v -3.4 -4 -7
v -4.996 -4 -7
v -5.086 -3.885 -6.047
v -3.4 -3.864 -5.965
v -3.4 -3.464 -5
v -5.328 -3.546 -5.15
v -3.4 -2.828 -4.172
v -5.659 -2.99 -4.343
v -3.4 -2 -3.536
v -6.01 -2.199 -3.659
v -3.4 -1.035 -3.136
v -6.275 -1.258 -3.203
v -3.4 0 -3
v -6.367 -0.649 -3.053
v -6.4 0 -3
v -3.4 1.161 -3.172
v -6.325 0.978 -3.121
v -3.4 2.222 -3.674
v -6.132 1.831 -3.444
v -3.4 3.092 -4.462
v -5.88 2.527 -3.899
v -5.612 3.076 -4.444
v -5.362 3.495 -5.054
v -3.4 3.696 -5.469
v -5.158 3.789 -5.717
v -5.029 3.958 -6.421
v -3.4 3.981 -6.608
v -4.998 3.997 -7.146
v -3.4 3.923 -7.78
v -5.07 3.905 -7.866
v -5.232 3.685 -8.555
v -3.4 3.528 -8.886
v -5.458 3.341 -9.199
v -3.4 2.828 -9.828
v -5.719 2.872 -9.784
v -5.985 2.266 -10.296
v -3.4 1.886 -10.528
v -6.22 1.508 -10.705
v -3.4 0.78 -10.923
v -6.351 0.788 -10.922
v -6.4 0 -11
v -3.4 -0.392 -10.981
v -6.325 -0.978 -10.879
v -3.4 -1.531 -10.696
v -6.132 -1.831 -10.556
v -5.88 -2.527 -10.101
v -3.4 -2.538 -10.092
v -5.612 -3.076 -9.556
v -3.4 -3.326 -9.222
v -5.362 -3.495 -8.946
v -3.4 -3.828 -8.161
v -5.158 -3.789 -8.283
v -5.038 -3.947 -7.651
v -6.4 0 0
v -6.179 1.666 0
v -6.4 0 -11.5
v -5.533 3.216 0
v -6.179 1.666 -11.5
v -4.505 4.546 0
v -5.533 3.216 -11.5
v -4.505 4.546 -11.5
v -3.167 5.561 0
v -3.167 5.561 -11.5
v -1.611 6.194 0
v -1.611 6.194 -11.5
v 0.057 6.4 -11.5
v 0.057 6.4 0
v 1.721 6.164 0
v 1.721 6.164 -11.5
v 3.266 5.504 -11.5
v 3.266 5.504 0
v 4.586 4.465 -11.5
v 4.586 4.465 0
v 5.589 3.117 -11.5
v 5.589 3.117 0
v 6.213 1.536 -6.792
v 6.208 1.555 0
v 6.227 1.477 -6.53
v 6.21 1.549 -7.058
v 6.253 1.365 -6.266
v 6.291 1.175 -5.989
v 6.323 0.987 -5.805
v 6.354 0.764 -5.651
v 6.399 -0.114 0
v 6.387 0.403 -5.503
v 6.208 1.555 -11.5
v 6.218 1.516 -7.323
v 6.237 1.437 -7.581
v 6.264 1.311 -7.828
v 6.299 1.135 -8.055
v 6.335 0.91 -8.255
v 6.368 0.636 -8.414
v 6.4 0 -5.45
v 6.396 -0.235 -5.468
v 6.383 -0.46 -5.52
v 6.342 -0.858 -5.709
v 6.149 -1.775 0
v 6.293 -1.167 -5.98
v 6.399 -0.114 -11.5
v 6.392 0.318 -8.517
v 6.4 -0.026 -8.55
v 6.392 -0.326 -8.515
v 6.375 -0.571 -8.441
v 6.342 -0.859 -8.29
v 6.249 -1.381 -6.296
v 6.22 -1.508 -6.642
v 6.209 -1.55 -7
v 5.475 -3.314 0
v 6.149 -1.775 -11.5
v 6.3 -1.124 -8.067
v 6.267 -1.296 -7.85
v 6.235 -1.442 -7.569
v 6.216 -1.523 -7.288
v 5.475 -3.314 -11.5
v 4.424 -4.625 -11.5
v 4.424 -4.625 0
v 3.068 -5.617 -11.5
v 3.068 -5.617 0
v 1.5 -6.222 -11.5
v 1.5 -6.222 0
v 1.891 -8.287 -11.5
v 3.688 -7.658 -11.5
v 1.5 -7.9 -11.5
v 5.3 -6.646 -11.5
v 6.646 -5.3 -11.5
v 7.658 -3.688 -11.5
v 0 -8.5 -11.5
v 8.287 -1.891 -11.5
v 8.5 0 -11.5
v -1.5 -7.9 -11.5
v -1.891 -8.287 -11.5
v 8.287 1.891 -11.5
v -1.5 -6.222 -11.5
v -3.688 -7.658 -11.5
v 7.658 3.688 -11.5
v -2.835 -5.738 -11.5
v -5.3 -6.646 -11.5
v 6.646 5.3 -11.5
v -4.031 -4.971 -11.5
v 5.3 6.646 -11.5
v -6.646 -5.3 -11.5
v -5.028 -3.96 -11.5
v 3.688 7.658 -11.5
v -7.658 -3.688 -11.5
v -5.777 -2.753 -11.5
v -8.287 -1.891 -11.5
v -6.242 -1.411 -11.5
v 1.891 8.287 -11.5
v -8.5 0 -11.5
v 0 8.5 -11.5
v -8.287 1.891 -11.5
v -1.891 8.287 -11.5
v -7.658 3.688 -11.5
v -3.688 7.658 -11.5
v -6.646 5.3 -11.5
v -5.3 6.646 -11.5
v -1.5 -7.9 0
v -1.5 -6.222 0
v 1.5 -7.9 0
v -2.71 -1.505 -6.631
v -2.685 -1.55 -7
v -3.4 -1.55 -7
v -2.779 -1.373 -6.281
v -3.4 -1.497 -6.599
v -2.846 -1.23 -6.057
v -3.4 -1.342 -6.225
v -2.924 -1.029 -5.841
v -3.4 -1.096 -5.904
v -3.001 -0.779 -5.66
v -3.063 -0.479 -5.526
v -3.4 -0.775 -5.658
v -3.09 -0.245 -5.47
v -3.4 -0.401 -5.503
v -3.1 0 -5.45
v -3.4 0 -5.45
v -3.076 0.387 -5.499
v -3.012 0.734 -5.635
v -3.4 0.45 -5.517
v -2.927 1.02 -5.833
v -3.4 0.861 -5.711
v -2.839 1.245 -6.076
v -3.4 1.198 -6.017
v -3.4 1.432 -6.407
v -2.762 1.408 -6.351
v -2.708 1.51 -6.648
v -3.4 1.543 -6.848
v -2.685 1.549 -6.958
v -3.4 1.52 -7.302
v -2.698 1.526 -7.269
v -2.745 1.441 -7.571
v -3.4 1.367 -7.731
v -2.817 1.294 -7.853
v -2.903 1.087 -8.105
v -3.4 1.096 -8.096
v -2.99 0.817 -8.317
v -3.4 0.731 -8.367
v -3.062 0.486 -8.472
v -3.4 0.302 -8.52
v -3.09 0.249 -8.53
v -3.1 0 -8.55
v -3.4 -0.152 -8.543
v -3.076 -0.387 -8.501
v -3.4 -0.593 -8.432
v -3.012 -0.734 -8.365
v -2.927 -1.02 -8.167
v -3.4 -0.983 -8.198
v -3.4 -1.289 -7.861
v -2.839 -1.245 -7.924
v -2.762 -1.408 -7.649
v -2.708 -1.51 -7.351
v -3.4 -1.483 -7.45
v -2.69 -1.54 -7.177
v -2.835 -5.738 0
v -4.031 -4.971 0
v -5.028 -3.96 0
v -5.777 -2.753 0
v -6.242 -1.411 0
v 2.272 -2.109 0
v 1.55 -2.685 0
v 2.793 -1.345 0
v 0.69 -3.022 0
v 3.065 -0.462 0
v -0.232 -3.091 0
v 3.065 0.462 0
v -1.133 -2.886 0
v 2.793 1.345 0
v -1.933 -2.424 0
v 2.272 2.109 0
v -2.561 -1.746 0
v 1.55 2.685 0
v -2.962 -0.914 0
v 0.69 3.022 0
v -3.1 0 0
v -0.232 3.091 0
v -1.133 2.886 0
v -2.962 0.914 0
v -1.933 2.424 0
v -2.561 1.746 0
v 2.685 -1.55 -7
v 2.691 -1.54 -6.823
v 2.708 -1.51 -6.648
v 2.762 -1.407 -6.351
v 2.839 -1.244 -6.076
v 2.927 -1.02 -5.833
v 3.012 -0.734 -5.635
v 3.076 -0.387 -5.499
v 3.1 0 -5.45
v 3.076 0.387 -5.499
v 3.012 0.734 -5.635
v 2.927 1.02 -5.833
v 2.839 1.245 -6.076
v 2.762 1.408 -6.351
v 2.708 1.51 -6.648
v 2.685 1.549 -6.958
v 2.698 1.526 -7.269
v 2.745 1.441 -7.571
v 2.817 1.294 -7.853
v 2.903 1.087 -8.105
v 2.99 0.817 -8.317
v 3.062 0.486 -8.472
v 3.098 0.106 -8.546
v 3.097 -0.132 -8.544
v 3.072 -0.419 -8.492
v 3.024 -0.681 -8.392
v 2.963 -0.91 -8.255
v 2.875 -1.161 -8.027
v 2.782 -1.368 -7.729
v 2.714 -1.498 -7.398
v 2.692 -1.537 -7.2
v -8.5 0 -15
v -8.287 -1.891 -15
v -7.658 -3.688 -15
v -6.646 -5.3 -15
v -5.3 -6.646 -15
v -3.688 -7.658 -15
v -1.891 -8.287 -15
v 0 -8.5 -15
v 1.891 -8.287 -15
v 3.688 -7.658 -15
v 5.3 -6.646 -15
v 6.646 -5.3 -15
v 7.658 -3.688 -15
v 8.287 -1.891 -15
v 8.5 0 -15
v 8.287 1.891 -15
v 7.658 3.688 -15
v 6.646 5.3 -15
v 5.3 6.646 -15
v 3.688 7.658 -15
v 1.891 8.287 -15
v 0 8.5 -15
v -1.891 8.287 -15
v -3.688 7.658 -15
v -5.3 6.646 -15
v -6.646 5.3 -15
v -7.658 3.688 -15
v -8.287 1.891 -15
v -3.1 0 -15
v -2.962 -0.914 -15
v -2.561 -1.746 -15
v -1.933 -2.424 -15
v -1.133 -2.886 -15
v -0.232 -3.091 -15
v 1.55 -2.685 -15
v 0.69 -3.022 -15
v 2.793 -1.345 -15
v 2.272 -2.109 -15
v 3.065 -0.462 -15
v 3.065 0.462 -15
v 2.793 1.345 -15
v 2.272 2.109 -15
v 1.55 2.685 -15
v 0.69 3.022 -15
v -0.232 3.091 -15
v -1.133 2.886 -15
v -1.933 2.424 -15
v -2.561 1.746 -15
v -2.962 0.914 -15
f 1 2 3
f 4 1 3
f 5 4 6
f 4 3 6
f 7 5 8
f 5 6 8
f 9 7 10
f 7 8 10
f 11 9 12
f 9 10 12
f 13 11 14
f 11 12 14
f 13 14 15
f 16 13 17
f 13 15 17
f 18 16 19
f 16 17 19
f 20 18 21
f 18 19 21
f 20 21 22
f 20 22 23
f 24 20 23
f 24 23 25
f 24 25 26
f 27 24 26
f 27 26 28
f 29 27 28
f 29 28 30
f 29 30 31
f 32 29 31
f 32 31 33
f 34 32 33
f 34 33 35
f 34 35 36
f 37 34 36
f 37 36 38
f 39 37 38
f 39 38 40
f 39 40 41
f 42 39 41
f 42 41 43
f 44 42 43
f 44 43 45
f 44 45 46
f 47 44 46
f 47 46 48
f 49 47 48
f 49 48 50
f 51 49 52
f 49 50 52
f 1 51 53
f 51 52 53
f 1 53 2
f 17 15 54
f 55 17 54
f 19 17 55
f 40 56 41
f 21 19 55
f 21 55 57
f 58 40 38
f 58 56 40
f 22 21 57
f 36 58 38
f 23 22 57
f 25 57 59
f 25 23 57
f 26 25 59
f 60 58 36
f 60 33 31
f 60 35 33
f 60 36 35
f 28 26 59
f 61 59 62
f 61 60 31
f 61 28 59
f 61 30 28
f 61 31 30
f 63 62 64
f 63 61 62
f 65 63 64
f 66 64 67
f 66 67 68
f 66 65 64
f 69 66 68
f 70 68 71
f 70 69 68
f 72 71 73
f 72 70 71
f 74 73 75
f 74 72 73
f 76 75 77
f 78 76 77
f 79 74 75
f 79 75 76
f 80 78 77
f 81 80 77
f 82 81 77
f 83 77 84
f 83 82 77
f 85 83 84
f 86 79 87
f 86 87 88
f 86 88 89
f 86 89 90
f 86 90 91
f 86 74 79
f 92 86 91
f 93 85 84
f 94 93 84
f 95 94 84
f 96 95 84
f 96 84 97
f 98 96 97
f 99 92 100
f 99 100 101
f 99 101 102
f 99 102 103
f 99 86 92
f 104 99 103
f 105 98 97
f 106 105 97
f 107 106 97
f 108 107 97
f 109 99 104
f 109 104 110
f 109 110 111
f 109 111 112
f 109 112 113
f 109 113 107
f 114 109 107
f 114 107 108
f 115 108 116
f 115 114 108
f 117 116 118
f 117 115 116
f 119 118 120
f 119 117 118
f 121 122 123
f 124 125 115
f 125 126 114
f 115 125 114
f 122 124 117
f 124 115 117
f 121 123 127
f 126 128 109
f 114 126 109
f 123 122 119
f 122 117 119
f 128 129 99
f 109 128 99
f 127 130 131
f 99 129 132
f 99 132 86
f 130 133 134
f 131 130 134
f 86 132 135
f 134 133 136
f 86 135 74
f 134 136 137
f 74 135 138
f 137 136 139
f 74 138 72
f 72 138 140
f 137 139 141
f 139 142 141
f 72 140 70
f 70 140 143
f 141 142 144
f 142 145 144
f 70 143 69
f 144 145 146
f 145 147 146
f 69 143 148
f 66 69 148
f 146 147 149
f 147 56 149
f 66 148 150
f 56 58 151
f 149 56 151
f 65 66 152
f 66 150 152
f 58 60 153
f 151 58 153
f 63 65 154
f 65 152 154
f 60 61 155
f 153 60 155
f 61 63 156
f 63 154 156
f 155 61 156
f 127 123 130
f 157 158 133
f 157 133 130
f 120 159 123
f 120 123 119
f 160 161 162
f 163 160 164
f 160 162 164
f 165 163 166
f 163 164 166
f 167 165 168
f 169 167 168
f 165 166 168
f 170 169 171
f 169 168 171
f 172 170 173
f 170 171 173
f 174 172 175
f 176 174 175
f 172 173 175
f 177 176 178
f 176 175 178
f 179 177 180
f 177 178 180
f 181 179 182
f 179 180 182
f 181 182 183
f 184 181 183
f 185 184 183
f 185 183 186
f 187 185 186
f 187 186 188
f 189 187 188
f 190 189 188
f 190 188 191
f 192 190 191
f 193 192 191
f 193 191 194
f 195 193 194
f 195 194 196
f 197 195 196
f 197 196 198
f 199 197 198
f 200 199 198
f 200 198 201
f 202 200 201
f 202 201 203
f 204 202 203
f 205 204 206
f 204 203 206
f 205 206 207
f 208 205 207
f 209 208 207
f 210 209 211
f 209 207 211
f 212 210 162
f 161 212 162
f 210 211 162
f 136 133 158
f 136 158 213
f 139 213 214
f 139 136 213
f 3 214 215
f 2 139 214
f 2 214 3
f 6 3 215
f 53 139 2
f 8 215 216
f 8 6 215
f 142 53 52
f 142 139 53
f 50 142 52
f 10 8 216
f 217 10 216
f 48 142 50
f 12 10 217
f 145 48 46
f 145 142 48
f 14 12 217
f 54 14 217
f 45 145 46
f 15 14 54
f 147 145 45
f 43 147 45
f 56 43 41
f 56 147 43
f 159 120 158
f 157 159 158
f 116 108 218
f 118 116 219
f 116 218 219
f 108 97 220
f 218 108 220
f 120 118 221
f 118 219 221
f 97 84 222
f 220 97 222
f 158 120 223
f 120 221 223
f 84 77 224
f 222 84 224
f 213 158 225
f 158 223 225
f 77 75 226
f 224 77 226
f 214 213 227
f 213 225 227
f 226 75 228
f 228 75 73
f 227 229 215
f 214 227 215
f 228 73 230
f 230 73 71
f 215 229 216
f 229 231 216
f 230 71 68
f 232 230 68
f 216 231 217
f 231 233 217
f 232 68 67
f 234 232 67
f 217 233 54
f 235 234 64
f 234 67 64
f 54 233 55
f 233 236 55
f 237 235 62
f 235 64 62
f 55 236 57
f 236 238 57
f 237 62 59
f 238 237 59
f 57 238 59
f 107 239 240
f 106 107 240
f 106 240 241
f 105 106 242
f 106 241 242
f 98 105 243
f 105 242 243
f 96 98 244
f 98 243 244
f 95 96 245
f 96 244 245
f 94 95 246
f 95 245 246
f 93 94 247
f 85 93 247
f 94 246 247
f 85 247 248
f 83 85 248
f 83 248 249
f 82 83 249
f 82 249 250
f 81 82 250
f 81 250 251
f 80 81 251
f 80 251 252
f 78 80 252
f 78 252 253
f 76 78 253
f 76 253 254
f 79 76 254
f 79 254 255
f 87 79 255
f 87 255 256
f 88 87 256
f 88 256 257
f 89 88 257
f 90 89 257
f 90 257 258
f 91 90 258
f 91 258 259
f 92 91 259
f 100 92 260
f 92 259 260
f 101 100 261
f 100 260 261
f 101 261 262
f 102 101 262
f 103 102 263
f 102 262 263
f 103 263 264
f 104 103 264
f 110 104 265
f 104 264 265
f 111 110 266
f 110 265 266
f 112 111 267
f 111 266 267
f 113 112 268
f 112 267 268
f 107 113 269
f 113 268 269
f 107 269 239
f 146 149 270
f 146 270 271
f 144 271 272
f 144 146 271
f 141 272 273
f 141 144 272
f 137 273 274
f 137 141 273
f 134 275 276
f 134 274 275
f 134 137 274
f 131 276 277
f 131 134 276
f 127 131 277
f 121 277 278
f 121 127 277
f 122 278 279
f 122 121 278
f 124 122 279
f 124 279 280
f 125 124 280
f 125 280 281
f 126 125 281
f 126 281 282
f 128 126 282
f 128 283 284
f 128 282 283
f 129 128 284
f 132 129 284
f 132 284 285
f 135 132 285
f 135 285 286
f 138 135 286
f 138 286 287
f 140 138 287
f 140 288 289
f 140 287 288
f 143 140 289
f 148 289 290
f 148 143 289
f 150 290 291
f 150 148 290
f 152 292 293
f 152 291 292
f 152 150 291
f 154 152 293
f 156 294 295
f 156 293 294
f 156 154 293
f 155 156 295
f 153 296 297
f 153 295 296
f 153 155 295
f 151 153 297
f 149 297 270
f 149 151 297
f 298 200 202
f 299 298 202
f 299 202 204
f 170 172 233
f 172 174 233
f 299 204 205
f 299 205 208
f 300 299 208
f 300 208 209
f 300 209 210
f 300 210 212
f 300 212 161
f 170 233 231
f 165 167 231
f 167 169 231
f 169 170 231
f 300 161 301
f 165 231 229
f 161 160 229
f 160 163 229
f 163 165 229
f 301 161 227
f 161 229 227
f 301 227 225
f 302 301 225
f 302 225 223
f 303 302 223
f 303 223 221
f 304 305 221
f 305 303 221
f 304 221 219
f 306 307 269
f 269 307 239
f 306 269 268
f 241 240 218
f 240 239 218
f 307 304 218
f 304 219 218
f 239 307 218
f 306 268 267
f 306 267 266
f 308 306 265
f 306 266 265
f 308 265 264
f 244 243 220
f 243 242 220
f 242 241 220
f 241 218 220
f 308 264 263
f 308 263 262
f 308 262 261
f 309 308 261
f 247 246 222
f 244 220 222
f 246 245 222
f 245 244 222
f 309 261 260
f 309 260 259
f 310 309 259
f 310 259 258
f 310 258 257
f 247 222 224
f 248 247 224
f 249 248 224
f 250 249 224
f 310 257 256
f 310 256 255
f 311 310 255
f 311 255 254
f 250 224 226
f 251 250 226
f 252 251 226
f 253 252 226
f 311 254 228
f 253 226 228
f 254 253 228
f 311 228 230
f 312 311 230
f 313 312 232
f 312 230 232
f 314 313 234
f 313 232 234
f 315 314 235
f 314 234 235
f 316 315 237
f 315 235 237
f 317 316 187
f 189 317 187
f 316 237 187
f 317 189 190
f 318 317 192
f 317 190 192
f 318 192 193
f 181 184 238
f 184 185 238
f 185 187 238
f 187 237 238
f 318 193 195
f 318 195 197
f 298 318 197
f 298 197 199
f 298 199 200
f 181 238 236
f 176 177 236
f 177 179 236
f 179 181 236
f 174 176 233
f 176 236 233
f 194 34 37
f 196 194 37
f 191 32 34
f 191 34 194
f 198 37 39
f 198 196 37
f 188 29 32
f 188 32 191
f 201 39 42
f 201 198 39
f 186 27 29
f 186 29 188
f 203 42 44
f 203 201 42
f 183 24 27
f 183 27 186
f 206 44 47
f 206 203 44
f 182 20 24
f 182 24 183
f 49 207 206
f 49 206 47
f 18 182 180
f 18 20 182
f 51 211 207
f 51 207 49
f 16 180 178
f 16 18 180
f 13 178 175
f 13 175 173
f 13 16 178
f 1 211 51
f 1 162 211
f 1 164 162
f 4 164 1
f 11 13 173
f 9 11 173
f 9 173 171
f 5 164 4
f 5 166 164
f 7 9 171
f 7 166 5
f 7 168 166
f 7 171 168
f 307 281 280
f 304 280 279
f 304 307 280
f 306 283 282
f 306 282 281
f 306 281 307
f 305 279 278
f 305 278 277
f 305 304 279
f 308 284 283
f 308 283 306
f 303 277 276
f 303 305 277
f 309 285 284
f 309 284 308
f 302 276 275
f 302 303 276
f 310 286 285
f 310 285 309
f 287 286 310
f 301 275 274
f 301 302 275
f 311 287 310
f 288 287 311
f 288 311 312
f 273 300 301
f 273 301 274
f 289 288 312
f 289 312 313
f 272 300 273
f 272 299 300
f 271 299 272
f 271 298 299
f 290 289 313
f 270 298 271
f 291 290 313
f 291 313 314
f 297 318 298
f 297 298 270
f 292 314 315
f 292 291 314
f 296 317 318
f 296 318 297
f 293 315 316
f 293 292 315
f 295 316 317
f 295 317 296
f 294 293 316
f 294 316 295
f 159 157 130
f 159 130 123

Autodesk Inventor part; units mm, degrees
ref_plane "YZ Plane" through (0, 0, 0) normal (1, 0, 0) x (0, 1, 0)
ref_plane "XZ Plane" through (0, 0, 0) normal (0, 1, 0) x (-1, 0, 0)
sketch "Sketch1" plane through (0, 0, 0) normal (0, 1, 0) x (-1, 0, 0)
  line L0 (0, 0) -> (0, -7)
  circle A0 centre (0, -7) radius 1.55
  line L1 (3.1, 0) -> (6.4, 0)
  circle A1 centre (0, -7) radius 4
  line L2 (0, -11) -> (0, -15)
  line L3 (3.1, -15) -> (3.1, 0)
  line L4 (6.4, 0) -> (6.4, -11.5)
  line L5 (6.35, -15) -> (3.1, -15)
  line L6 (3.1, -15) -> (8.5, -15)
  line L7 (8.5, -15) -> (8.5, -11.5)
  line L8 (8.5, -11.5) -> (6.4, -11.5)
  line L9 (6.4, 0) -> (7.9, 0)
  line L10 (7.9, 0) -> (7.9, -11.5)
  line L11 (6.4, 0) -> (4.9, 0)
  line L12 (4.9, 0) -> (4.9, -11.5)
  line L13 (4.9, -11.5) -> (6.4, -11.5)
  dimension "d4" = 8
  dimension "d0" = 7
  dimension "d1" = 3.1
  dimension "d2" = 6.4
  dimension "d3" = 3.1
  dimension "d5" = 4
  dimension "d6" = 8.5
  dimension "d7" = 3.5
  dimension "d18" = 1.5
  dimension "d19" = 1.5
revolve "Revolution1" add sketch "Sketch1" angle 360 about axis through (0, 0, 0) along (0, 0, -1) picked at (3.2637, -7.5872) contours L3 L1 L12 L13 L8 L7 L6 L5 A1 | A1 L3 | L1 L4 L13 L12
ref_plane "Work Plane1" through (-6.4, 0, 0) normal (-1, 0, 0) x (0, -1, 0)
sketch "Sketch2" plane through (-6.4, 0, 0) normal (-1, 0, 0) x (0, -1, 0)
  line L0 (0, 0) -> (0, -7)
  circle A0 centre (0, -7) radius 1.55
  circle A1 centre (0, -7) radius 4
  dimension "d11" = 7
  dimension "d12" = 3.1
  dimension "d13" = 8
extrude "Extrusion2" cut sketch "Sketch2" against normal blind 30 contours A0
extrude "Extrusion3" cut sketch "Sketch2" against normal blind 3
sketch "Sketch3" plane through (0, 0, 0) normal (0, 0, 1) x (1, 0, 0)
  circle A0 centre (0, 0) radius 3.1 projected
  line L0 (0, -3.1) -> (0, -6.4)
  circle A1 centre (0, 0) radius 6.4 projected
  line L1 (0, -6.4) -> (0, -7.9)
  line L2 (0, -6.4) -> (0, -4.9)
  line L3 (0, -4.9) -> (-1.5, -4.9)
  line L4 (-1.5, -4.9) -> (-1.5, -7.9)
  line L5 (-1.5, -7.9) -> (0, -7.9)
  line L6 (0, -7.9) -> (1.5, -7.9)
  line L7 (1.5, -7.9) -> (1.5, -4.9)
  line L8 (1.5, -4.9) -> (0, -4.9)
  dimension "d20" = 1.5
  dimension "d21" = 1.5
  dimension "d22" = 1.5
  dimension "d23" = 1.5
extrude "Extrusion4" add sketch "Sketch3" against normal blind 11.5 contours L8 L7 A1 L0 | L0 A1 L4 L3 | L1 L5 L4 A1 | A1 L7 L6 L1
properties part number "dc_to_omni_coupler_small"
